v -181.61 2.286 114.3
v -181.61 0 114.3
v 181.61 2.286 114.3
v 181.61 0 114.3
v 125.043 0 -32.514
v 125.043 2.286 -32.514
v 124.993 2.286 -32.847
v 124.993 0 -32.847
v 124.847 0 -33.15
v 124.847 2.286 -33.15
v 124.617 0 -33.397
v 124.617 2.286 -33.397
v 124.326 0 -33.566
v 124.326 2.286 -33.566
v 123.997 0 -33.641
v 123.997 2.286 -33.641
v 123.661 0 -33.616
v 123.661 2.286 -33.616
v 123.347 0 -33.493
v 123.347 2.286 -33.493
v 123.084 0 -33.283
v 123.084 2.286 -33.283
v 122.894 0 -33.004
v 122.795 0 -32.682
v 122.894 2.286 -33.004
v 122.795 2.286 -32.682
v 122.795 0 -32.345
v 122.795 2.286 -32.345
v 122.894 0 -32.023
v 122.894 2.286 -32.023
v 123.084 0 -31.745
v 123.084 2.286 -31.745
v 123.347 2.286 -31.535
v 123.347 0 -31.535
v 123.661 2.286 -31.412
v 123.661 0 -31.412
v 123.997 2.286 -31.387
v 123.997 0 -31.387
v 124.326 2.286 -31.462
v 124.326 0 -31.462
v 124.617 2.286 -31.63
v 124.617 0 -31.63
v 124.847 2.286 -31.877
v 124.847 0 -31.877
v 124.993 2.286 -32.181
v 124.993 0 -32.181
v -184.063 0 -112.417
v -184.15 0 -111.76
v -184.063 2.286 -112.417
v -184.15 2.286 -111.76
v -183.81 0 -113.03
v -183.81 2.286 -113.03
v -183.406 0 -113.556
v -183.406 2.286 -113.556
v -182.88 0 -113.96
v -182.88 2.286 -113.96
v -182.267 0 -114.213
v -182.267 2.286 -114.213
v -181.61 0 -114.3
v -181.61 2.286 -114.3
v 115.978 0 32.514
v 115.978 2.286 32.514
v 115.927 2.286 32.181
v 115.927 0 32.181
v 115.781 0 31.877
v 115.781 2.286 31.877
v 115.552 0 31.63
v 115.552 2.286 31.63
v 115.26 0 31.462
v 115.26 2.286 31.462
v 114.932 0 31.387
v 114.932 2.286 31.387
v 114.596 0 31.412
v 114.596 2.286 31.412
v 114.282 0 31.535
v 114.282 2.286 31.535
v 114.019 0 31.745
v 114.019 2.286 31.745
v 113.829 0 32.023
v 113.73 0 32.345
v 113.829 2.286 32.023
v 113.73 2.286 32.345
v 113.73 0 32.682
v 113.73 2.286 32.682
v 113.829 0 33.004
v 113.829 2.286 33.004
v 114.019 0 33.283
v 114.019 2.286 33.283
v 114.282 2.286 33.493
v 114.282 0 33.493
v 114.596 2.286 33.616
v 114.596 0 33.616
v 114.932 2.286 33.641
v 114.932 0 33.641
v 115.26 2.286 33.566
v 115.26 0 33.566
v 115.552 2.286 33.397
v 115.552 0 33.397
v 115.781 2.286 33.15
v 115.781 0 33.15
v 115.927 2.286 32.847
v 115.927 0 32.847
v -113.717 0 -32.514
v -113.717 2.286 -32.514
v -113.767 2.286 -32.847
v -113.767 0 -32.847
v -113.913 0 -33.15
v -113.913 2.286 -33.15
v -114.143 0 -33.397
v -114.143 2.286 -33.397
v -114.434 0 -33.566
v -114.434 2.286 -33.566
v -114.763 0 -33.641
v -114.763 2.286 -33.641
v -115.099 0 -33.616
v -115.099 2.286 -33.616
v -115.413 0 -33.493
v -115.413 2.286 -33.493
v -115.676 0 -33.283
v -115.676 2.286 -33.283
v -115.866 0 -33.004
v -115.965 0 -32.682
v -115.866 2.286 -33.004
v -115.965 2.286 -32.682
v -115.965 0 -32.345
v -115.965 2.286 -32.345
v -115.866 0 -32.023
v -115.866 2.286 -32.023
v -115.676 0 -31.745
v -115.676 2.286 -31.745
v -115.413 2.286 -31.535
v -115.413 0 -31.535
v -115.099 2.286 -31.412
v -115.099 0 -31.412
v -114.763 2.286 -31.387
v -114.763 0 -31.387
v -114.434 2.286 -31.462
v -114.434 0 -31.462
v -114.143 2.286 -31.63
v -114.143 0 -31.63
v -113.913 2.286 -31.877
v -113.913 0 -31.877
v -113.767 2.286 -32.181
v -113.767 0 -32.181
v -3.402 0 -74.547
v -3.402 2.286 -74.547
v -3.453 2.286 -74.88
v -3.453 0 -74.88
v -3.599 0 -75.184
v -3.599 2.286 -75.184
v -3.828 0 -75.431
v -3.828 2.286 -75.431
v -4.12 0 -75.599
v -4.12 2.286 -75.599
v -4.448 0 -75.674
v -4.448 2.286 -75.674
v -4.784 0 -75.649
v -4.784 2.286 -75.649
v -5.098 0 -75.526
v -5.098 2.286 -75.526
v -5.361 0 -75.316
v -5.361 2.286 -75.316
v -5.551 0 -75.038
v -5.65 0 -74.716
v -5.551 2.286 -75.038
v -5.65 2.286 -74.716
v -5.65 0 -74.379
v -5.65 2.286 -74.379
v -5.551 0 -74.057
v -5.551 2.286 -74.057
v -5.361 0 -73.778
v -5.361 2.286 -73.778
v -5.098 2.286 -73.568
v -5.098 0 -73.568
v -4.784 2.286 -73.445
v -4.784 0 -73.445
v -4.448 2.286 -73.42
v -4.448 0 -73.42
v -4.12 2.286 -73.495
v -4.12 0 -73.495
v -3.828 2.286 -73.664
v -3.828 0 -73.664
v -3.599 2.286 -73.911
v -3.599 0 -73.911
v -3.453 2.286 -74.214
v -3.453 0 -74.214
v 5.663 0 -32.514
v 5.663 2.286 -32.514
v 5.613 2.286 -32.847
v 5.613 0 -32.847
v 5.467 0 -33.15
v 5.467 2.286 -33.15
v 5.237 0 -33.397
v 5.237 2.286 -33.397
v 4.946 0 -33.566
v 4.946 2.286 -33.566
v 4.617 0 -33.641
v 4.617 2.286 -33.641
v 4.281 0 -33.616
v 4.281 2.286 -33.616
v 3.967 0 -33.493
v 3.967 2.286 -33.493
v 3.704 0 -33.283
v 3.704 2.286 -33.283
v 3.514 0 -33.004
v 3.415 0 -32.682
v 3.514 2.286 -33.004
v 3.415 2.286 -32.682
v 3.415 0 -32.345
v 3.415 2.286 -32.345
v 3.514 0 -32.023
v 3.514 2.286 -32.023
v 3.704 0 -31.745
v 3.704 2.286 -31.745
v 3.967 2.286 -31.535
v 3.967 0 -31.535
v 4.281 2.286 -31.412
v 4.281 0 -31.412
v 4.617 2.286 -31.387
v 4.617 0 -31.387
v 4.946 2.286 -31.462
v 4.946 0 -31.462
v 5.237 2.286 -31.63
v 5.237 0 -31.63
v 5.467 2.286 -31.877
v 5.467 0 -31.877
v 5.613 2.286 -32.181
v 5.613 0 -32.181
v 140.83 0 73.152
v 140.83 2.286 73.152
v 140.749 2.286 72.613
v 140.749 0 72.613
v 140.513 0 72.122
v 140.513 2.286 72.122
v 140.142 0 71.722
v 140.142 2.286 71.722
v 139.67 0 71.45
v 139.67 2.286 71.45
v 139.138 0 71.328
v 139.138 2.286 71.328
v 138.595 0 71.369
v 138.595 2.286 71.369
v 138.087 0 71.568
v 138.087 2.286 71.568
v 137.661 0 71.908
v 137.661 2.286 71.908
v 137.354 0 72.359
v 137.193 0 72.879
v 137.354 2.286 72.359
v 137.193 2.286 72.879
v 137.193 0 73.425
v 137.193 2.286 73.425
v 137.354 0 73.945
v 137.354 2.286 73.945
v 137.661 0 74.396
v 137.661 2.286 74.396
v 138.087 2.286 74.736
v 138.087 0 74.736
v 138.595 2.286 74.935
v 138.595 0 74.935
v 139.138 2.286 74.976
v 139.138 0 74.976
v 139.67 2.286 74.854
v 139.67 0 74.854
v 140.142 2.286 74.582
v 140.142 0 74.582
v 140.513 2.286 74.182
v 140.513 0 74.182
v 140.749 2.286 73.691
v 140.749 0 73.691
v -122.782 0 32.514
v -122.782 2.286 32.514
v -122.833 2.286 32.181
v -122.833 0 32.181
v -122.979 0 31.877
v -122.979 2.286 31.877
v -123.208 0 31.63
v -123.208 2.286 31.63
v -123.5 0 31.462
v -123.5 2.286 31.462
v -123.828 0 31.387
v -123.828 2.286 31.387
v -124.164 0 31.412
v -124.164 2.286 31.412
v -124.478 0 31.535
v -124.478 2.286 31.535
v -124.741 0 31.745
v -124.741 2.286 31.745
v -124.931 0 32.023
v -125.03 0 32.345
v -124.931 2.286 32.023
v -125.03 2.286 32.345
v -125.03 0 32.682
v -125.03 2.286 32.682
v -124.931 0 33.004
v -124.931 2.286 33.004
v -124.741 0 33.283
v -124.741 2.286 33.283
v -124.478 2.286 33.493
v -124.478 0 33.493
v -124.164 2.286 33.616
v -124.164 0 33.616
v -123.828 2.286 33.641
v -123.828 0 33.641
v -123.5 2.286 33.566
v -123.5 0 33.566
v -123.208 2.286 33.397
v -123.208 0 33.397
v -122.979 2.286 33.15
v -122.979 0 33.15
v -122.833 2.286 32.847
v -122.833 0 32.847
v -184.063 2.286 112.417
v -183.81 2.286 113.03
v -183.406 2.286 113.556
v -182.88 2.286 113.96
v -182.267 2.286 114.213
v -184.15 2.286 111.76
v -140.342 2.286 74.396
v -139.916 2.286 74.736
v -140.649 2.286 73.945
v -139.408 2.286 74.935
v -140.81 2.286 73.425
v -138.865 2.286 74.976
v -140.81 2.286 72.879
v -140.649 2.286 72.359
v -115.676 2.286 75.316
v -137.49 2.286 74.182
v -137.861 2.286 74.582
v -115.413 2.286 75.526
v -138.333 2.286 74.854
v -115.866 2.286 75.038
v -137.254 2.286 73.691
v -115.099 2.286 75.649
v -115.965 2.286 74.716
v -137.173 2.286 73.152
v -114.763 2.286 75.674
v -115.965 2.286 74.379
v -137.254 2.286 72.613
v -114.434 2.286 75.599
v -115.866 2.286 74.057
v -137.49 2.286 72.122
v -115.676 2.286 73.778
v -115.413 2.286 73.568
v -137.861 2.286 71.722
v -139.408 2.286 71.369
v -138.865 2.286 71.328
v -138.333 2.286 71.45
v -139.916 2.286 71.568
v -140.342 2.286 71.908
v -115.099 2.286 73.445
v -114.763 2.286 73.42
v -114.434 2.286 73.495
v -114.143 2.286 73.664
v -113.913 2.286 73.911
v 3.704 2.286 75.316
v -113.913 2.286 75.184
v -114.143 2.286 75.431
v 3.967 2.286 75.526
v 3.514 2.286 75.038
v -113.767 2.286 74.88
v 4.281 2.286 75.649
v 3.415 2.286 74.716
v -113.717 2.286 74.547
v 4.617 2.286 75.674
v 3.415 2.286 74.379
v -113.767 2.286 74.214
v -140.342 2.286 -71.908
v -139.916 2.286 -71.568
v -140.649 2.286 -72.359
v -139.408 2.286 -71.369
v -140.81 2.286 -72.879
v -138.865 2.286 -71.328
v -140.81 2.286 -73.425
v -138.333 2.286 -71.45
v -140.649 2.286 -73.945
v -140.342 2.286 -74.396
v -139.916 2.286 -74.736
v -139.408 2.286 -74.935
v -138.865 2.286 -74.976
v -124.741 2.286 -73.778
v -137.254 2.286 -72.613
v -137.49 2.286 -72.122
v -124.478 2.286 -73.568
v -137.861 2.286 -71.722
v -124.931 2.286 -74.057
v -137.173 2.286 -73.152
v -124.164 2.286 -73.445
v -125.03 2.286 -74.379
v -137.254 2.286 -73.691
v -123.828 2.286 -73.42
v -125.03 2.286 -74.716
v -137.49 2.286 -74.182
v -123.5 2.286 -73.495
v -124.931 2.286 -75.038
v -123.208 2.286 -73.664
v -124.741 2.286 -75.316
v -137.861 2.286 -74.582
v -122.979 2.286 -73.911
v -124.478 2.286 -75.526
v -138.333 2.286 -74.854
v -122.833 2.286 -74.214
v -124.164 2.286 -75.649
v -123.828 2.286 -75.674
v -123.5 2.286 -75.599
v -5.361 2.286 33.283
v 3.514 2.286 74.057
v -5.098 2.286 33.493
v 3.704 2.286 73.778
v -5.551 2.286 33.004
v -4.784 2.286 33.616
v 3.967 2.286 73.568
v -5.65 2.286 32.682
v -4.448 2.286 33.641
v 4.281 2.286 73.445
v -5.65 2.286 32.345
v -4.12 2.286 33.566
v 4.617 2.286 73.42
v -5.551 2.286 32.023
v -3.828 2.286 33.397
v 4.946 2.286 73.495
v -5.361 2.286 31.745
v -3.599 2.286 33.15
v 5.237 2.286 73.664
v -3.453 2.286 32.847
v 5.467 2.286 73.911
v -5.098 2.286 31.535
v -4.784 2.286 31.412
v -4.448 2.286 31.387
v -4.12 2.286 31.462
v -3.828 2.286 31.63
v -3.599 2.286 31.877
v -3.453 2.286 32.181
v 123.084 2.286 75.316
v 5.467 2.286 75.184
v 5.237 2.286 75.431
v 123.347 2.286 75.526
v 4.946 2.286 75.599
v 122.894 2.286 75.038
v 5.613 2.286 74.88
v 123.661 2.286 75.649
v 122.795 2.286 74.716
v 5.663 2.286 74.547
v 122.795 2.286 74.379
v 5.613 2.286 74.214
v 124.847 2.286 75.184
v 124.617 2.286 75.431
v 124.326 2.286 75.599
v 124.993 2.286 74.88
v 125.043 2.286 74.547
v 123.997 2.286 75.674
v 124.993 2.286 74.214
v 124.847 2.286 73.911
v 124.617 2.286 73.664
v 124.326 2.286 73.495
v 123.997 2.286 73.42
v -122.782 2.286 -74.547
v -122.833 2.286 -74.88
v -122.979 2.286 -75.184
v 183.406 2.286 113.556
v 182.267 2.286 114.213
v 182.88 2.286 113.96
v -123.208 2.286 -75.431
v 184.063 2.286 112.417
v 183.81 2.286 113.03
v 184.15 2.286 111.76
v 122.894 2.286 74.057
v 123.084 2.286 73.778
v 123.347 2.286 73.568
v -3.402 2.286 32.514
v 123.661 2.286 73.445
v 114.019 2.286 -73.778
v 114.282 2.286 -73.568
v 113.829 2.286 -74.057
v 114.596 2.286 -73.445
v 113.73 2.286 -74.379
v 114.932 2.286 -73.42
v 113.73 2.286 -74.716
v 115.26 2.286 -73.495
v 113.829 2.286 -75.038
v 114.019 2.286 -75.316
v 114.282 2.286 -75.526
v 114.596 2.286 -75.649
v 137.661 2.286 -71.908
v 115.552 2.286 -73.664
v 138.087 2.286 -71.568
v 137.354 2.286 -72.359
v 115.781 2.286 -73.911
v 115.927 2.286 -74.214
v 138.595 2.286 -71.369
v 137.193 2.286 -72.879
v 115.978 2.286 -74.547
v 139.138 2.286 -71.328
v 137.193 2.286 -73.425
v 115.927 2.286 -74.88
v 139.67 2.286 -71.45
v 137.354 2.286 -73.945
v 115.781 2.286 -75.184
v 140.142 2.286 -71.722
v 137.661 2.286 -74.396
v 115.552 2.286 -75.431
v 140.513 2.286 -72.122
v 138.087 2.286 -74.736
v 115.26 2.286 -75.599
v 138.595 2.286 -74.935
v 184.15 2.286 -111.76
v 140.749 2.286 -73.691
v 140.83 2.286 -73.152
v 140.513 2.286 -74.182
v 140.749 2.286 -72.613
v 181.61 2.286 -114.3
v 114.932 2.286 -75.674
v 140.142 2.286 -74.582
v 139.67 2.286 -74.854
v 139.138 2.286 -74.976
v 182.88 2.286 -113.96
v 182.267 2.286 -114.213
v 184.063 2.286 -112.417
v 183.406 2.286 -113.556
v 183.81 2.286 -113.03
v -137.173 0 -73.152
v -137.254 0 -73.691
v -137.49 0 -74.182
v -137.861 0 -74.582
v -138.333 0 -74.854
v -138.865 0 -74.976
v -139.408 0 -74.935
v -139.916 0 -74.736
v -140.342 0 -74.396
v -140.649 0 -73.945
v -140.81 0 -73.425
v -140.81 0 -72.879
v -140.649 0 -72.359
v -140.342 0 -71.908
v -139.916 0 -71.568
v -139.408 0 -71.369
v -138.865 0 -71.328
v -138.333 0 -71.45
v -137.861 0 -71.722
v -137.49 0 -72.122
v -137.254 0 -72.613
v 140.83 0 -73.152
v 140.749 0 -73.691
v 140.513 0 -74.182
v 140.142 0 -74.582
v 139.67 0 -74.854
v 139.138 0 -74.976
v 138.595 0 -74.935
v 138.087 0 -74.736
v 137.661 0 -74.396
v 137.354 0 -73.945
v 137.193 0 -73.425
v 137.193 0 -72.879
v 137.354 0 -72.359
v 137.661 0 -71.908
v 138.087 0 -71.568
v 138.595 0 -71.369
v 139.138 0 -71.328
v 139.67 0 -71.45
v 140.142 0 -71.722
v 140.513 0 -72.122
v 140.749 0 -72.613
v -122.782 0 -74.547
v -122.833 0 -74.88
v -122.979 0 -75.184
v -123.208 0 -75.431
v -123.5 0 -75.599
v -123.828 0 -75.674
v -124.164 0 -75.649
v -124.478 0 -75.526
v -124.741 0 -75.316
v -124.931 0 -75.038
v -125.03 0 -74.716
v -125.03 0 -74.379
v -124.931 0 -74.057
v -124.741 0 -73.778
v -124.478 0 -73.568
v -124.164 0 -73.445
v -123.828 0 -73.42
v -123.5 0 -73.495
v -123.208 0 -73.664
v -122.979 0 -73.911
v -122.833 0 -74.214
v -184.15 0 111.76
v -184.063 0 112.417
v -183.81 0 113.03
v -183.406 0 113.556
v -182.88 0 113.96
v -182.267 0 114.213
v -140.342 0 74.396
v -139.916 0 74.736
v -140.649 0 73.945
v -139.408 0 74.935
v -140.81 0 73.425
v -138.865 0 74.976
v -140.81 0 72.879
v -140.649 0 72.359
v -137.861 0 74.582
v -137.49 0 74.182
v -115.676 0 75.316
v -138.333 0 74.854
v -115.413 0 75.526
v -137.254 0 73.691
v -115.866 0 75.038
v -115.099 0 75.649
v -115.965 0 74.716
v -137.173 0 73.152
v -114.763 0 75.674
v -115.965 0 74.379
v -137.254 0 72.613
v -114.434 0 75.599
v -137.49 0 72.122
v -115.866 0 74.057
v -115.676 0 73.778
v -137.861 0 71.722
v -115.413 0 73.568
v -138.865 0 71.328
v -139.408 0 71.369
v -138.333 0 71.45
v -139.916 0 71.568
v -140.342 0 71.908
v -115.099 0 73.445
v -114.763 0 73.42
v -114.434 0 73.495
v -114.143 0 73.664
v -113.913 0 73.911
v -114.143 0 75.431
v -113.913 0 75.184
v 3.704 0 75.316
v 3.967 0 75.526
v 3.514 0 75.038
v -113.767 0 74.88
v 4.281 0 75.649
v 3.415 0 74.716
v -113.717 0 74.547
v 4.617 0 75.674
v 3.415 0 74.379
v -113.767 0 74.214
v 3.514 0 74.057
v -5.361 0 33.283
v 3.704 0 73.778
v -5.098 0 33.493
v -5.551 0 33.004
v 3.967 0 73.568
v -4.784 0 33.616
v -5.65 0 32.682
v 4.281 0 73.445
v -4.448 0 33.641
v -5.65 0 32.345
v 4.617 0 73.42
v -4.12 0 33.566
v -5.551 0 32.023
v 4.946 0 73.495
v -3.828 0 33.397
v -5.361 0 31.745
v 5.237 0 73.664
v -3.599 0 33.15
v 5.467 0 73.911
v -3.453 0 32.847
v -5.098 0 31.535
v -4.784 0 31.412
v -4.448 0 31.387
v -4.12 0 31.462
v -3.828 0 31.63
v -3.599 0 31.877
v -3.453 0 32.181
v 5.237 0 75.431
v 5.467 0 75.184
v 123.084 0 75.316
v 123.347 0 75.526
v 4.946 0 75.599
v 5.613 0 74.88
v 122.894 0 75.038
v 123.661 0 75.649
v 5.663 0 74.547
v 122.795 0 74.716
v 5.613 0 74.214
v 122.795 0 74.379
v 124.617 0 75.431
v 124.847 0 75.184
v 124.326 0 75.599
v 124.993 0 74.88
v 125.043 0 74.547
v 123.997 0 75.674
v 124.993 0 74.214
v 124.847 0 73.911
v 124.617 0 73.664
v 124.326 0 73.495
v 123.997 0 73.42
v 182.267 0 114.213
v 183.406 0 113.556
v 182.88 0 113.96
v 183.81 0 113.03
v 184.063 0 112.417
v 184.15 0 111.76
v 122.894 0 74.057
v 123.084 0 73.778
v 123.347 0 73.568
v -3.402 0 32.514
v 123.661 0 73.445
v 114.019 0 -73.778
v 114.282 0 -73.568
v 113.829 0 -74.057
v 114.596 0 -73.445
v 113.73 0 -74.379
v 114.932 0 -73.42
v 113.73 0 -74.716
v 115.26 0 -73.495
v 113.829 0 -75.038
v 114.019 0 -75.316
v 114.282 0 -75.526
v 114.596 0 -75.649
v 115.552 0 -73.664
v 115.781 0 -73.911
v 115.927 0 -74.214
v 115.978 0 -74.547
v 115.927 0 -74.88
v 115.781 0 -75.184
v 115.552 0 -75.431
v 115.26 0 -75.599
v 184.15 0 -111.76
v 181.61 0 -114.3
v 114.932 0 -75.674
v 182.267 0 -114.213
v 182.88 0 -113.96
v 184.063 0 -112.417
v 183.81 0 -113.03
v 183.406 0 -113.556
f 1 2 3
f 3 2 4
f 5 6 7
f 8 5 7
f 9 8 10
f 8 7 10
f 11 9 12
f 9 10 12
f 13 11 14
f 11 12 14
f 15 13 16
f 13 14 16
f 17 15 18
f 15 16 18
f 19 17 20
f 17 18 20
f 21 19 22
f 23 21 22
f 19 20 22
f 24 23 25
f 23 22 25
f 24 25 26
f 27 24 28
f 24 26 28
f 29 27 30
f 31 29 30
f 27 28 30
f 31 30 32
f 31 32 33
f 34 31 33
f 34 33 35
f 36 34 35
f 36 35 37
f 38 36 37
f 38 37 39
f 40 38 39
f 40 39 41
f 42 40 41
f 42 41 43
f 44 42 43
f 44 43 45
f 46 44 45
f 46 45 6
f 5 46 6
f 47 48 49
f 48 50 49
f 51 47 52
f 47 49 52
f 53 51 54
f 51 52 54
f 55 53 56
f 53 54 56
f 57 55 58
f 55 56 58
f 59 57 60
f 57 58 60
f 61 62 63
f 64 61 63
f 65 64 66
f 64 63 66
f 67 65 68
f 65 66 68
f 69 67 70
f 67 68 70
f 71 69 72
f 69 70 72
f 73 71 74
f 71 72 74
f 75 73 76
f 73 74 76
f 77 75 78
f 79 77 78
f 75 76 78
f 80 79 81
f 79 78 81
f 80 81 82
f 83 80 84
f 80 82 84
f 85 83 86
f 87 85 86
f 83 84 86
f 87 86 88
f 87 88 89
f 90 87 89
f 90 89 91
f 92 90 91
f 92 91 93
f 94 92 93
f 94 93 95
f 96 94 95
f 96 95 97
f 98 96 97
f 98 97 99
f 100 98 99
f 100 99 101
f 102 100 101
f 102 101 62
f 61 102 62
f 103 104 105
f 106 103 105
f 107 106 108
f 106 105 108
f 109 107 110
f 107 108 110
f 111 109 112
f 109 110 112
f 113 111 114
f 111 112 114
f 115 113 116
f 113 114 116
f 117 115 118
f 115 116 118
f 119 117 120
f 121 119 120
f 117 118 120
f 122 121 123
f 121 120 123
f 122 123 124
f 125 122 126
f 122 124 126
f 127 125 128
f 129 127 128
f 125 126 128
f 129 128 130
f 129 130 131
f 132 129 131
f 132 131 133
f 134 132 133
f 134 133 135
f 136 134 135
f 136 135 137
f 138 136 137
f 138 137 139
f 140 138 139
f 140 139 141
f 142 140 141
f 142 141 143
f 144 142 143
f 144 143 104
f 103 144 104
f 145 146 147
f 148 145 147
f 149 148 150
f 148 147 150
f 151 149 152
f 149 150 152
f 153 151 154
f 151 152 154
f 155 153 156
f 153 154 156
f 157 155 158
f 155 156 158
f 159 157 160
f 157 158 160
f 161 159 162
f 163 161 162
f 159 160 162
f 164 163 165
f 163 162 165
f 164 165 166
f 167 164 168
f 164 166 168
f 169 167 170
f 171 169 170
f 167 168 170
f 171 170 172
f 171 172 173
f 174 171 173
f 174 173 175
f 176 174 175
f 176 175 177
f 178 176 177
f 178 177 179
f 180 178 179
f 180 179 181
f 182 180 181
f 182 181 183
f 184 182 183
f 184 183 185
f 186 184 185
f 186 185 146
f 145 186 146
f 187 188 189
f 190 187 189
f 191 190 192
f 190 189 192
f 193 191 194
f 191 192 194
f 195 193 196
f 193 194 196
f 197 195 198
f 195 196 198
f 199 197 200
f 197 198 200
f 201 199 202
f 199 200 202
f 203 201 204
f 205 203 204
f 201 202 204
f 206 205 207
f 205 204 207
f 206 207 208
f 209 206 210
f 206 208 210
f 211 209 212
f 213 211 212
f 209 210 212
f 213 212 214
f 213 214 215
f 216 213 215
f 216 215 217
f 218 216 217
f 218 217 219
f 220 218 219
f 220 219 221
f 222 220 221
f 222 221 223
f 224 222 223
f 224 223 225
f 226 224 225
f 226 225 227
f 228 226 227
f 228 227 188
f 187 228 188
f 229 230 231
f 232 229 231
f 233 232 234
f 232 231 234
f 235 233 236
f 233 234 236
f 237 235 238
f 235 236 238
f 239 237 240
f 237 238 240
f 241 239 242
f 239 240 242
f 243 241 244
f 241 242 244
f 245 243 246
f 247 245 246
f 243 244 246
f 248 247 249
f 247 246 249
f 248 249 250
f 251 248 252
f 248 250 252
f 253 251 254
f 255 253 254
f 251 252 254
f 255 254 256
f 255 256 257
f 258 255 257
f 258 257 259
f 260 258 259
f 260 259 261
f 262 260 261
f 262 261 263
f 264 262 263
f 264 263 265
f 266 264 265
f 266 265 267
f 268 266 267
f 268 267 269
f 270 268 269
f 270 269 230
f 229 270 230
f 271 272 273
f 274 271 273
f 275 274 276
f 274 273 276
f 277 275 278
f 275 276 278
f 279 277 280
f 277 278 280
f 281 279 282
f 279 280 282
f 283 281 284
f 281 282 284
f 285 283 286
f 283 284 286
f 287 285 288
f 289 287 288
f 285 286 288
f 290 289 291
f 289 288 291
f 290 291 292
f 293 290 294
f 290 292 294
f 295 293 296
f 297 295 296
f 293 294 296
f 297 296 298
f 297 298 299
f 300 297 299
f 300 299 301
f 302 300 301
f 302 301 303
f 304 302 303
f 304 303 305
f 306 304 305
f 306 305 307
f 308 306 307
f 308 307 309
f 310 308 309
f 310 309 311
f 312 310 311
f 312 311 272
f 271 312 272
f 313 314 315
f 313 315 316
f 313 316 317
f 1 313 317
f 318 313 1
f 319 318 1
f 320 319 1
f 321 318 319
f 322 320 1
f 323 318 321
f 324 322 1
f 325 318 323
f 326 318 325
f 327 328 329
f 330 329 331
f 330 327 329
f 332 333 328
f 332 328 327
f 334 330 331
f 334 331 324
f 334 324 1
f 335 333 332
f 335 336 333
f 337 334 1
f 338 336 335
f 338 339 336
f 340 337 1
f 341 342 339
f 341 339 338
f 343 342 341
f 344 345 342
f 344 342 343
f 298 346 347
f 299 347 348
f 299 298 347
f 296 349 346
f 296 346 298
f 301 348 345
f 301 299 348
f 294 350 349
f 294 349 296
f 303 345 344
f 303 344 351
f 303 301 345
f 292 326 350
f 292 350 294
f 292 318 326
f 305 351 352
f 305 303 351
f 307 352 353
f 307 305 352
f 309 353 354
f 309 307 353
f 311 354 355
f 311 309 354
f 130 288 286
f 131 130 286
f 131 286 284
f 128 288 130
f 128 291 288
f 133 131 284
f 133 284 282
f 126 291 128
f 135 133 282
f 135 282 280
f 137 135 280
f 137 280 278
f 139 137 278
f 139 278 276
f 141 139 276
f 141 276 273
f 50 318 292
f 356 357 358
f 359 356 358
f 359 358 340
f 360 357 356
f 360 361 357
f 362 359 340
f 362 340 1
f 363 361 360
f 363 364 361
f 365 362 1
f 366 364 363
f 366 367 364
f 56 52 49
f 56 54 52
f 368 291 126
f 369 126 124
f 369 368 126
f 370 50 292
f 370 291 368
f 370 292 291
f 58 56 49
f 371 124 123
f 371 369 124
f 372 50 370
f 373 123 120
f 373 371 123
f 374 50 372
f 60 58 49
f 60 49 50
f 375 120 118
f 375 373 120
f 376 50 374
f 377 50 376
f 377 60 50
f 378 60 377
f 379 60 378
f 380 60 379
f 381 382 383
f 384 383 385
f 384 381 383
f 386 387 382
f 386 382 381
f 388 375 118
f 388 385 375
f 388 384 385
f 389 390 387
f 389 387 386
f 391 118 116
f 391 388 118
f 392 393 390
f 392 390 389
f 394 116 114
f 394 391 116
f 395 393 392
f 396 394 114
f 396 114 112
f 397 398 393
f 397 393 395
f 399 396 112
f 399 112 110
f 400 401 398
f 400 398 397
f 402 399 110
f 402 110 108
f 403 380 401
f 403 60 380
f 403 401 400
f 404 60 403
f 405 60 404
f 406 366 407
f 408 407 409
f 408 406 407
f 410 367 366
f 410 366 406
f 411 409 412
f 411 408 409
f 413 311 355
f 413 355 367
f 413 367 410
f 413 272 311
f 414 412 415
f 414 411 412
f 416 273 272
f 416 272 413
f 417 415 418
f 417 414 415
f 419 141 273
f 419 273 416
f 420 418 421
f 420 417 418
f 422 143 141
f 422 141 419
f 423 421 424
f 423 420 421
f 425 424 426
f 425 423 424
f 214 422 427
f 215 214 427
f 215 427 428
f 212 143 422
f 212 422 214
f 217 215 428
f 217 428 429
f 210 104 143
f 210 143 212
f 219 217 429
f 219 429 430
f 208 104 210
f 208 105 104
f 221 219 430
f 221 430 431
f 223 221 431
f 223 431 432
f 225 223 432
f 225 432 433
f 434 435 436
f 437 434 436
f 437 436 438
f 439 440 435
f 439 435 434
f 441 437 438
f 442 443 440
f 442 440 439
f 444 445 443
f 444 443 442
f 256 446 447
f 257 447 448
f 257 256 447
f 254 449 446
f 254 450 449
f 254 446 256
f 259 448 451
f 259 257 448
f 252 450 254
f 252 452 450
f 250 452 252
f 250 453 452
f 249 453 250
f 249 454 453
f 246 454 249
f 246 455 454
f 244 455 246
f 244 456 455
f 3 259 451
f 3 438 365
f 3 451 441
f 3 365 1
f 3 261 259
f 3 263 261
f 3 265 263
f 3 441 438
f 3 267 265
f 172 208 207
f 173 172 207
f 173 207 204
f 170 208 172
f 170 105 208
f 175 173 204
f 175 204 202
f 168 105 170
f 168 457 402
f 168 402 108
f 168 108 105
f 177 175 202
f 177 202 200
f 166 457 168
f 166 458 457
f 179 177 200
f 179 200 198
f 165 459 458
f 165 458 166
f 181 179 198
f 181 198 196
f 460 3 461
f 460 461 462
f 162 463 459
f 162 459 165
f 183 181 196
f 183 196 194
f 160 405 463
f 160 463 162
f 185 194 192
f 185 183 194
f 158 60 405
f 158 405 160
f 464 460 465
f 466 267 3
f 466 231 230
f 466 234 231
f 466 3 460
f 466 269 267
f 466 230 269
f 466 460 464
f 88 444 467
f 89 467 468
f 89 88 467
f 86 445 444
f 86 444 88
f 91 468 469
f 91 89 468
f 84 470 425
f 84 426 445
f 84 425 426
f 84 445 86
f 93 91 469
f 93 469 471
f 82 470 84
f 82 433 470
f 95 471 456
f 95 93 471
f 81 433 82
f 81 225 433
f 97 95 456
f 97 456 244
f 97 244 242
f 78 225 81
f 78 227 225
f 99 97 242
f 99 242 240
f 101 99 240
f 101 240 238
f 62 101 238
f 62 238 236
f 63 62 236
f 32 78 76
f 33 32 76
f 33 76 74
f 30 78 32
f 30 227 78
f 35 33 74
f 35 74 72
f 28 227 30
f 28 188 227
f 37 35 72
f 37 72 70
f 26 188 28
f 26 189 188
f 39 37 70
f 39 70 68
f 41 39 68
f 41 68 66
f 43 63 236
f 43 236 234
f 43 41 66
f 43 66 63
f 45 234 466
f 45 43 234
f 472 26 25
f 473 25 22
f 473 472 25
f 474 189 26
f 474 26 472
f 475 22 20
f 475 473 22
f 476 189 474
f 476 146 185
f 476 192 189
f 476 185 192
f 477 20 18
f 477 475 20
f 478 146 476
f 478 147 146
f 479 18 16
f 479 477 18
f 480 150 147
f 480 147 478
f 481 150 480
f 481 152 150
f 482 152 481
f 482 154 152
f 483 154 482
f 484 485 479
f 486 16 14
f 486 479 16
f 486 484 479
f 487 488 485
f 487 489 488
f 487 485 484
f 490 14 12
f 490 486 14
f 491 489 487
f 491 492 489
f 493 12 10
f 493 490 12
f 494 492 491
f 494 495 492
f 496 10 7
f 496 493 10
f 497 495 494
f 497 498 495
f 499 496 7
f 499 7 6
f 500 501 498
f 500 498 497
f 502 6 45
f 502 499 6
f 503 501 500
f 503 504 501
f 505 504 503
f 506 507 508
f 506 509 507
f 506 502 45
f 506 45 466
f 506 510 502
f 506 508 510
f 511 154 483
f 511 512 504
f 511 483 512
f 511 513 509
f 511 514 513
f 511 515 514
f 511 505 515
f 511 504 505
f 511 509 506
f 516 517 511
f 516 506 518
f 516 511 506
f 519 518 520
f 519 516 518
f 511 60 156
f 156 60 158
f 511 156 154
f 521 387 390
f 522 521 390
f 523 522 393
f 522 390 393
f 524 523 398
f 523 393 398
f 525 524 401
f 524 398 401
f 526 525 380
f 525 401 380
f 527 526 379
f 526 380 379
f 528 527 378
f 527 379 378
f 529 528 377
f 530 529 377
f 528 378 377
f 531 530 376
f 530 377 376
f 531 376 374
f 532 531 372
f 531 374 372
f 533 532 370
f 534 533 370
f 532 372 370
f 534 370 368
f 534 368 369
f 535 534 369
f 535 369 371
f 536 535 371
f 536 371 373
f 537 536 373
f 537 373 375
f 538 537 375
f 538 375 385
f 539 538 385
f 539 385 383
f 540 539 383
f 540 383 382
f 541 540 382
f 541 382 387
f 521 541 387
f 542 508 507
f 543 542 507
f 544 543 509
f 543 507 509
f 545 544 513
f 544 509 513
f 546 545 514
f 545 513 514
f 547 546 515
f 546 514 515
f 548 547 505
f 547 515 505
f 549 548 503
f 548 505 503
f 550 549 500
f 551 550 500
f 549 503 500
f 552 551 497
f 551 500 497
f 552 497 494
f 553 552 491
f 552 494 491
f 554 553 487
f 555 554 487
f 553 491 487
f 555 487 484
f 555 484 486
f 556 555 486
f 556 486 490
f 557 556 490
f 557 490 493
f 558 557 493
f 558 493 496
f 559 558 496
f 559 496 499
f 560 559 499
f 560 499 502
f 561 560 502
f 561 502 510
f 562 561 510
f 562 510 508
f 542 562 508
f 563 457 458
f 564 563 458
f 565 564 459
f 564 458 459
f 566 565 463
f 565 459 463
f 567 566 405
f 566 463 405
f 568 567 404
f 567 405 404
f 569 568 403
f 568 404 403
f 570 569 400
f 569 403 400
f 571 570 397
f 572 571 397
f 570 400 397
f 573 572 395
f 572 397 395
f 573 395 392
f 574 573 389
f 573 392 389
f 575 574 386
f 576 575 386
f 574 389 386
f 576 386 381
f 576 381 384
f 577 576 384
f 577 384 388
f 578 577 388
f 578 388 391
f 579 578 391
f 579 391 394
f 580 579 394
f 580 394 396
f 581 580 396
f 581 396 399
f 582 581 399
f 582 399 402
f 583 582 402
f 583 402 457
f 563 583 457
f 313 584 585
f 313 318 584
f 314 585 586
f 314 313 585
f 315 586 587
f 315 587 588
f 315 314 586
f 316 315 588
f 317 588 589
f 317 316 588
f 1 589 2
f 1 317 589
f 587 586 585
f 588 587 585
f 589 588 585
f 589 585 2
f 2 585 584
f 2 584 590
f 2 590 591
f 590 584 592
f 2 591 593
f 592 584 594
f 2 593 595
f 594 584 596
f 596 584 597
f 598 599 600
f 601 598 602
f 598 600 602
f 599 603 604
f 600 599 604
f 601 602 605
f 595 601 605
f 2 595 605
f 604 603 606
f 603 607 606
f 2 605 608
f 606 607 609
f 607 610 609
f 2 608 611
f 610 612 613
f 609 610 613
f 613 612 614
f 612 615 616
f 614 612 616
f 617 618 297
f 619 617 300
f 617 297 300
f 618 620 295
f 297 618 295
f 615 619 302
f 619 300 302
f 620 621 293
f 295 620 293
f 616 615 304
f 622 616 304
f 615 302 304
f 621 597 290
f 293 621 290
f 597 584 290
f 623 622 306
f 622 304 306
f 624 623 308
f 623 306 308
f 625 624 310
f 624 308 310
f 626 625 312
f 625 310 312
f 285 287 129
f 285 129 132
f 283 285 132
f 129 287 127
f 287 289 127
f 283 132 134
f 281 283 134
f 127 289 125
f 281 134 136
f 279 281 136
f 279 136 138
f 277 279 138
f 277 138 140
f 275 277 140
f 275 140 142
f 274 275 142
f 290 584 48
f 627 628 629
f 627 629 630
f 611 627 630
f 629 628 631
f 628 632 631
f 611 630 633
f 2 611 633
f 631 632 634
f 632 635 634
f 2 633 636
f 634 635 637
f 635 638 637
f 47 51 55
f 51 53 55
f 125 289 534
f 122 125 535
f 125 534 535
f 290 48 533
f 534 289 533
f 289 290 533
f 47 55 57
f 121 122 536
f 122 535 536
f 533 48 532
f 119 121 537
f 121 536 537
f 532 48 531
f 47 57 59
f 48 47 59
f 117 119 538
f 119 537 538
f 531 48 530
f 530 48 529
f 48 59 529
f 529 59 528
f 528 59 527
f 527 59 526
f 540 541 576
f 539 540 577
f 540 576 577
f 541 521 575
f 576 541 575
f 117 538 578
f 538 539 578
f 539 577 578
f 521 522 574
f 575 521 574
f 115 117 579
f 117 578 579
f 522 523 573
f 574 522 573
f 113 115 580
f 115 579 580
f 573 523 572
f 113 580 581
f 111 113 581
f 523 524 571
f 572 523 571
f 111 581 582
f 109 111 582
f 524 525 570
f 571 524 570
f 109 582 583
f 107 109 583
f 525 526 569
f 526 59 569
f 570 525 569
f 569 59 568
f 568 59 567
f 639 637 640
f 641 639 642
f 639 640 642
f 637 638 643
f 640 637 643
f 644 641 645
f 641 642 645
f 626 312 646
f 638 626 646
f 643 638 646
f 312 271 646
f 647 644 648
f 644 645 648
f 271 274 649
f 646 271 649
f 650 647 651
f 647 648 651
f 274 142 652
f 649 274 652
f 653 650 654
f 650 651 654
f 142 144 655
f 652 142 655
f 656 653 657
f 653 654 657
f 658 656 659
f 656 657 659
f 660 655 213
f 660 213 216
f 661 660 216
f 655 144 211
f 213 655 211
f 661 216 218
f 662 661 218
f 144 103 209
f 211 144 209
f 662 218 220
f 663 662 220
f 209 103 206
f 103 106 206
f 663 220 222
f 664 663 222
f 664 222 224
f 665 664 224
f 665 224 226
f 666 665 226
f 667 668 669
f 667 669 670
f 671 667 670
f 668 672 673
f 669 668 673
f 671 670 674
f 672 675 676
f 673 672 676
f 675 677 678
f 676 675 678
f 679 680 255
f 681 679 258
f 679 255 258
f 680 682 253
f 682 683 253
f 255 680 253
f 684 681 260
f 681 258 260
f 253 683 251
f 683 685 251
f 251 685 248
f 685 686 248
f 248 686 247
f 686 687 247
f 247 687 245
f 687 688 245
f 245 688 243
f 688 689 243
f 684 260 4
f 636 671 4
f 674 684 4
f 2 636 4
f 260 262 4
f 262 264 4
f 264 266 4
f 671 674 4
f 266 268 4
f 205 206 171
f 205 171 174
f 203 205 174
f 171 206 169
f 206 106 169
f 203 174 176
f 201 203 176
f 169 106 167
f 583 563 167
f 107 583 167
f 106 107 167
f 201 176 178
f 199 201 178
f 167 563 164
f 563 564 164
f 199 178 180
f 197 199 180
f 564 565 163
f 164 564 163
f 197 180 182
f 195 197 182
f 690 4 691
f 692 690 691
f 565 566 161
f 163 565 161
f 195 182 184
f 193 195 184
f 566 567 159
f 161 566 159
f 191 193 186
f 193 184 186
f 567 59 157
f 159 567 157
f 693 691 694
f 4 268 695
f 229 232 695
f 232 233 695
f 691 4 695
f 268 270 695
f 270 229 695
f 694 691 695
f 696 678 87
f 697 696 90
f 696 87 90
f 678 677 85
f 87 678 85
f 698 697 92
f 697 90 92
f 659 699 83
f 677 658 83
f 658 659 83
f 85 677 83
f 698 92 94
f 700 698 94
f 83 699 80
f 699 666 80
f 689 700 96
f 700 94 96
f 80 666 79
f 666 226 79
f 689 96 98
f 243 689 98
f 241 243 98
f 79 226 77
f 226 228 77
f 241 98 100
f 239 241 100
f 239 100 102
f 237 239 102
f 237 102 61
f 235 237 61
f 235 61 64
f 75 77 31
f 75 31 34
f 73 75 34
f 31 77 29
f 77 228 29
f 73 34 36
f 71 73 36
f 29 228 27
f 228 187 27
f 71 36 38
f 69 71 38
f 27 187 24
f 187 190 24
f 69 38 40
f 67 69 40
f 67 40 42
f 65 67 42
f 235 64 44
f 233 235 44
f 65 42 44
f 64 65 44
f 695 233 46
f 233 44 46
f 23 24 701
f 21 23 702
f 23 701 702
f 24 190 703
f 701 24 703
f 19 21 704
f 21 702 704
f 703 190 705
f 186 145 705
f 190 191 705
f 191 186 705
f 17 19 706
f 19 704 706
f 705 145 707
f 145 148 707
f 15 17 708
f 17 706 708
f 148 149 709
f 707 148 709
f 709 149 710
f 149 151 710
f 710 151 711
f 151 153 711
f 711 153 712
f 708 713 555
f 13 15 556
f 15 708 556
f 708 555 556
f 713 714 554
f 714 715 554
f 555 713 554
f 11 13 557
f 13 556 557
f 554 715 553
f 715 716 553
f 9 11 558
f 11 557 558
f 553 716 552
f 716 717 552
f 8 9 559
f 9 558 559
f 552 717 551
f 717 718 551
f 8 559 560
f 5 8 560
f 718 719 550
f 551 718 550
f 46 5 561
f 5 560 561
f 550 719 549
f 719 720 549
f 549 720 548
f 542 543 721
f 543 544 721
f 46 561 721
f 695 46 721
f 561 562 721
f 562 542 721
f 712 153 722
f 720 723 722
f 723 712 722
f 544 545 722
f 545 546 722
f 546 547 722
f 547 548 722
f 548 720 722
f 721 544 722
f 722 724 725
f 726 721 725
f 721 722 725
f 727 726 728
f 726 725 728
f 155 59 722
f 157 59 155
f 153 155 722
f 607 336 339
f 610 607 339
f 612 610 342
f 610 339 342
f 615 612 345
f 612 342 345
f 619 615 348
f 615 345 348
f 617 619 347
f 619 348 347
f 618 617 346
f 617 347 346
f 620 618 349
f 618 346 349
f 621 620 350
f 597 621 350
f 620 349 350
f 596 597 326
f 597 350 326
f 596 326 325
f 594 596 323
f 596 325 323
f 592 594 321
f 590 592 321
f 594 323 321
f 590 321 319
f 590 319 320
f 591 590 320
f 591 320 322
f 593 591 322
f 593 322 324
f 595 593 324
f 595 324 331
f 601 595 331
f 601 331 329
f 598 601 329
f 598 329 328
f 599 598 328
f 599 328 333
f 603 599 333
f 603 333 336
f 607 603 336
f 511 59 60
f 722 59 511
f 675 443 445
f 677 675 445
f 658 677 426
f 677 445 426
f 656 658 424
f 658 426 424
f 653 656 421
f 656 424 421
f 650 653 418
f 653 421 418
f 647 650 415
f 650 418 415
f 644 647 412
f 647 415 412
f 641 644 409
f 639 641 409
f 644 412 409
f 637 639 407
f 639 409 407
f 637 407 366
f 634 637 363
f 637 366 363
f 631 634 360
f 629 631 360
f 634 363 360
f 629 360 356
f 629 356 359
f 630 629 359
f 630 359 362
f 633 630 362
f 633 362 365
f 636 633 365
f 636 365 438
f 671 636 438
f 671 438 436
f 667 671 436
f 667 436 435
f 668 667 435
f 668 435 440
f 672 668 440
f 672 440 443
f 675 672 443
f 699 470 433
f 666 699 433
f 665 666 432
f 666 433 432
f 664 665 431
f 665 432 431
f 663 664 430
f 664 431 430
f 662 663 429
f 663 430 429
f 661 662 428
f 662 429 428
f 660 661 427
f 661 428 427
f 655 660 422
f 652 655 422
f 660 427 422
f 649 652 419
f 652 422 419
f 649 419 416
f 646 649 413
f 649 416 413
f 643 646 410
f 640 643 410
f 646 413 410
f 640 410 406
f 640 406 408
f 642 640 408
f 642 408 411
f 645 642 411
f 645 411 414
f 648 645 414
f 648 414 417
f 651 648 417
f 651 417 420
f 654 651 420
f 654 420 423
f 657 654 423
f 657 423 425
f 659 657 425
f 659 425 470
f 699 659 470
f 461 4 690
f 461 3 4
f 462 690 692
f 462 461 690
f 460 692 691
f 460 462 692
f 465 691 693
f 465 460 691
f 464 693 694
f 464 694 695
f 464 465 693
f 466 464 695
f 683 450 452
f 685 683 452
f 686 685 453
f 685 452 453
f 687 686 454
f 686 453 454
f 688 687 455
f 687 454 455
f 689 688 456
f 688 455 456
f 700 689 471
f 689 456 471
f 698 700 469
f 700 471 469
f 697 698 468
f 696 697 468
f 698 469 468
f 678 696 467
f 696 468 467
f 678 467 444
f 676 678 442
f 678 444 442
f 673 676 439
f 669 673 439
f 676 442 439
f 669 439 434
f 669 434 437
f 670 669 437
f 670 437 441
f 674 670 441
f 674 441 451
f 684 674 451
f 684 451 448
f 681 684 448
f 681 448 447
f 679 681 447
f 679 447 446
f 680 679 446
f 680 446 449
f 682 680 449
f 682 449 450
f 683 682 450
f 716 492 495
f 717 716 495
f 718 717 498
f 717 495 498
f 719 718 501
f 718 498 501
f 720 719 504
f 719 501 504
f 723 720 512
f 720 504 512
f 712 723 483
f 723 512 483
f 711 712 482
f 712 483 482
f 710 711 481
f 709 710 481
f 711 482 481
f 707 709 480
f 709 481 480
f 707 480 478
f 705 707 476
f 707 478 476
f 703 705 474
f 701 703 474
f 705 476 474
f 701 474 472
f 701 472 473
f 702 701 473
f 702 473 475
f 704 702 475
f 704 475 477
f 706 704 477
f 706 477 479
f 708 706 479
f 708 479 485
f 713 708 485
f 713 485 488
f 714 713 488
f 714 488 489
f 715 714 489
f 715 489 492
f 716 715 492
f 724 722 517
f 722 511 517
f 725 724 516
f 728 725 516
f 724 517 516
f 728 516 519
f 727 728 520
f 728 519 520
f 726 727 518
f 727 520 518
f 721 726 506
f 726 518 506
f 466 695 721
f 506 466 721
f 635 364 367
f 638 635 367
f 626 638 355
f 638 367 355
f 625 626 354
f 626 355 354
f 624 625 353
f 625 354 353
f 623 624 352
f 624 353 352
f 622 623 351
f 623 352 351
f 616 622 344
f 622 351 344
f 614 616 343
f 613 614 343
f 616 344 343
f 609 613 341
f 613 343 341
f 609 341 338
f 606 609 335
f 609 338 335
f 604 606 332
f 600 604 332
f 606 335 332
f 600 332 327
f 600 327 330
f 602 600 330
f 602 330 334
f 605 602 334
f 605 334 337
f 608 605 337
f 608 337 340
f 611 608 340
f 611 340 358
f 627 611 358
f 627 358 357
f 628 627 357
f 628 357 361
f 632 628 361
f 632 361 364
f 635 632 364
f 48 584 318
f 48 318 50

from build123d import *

# Parameters (mm, degrees)
SKETCH1_W                 = 368.3
SKETCH1_H                 = 228.6
BOSS_EXTRUDE1_DEPTH       = 2.286
F_6_CLEARANCE_HOLE1_D     = 3.6576
TAP_DRILL_FOR_4_40_TAP1_D = 2.2606
FILLET1_R                 = 2.54


with BuildPart() as part:
    # Sketch1 → Boss-Extrude1 (new body)
    with BuildSketch(Plane(origin=(0, 0, 0), x_dir=(1, 0, 0), z_dir=(0, 1, 0))):
        Rectangle(SKETCH1_W, SKETCH1_H)
    extrude(amount=BOSS_EXTRUDE1_DEPTH)

    # #6 Clearance Hole1 (through all)
    with Locations(Plane(origin=(0, 0, 0), x_dir=(-1, 0, 0), z_dir=(0, -1, 0))):
        with Locations((-139.0015, 73.152), (139.0015, 73.152), (139.0015, -73.152), (-139.0015, -73.152)):
            Hole(F_6_CLEARANCE_HOLE1_D / 2)

    # Tap Drill for #4-40 Tap1 (through all)
    with Locations(Plane(origin=(0, 0, 0), x_dir=(-1, 0, 0), z_dir=(0, -1, 0))):
        with Locations((-114.847391596, 74.54728998), (-123.912608404, 32.51371002), (4.532608404, 74.54728998), (-4.532608404, 32.51371002), (123.912608404, 74.54728998), (114.847391596, 32.51371002), (123.912608404, -32.51371002), (114.847391596, -74.54728998), (4.532608404, -32.51371002), (-4.532608404, -74.54728998), (-114.847391596, -32.51371002), (-123.912608404, -74.54728998)):
            Hole(TAP_DRILL_FOR_4_40_TAP1_D / 2)

    # Fillet1
    fillet1_edges = [part.edges().sort_by_distance(p)[0] for p in [
        (184.15, 1.143, 114.3),
        (-184.15, 1.143, 114.3),
        (-184.15, 1.143, -114.3),
        (184.15, 1.143, -114.3),
    ]]
    fillet(fillet1_edges, radius=FILLET1_R)


solid = part.part
